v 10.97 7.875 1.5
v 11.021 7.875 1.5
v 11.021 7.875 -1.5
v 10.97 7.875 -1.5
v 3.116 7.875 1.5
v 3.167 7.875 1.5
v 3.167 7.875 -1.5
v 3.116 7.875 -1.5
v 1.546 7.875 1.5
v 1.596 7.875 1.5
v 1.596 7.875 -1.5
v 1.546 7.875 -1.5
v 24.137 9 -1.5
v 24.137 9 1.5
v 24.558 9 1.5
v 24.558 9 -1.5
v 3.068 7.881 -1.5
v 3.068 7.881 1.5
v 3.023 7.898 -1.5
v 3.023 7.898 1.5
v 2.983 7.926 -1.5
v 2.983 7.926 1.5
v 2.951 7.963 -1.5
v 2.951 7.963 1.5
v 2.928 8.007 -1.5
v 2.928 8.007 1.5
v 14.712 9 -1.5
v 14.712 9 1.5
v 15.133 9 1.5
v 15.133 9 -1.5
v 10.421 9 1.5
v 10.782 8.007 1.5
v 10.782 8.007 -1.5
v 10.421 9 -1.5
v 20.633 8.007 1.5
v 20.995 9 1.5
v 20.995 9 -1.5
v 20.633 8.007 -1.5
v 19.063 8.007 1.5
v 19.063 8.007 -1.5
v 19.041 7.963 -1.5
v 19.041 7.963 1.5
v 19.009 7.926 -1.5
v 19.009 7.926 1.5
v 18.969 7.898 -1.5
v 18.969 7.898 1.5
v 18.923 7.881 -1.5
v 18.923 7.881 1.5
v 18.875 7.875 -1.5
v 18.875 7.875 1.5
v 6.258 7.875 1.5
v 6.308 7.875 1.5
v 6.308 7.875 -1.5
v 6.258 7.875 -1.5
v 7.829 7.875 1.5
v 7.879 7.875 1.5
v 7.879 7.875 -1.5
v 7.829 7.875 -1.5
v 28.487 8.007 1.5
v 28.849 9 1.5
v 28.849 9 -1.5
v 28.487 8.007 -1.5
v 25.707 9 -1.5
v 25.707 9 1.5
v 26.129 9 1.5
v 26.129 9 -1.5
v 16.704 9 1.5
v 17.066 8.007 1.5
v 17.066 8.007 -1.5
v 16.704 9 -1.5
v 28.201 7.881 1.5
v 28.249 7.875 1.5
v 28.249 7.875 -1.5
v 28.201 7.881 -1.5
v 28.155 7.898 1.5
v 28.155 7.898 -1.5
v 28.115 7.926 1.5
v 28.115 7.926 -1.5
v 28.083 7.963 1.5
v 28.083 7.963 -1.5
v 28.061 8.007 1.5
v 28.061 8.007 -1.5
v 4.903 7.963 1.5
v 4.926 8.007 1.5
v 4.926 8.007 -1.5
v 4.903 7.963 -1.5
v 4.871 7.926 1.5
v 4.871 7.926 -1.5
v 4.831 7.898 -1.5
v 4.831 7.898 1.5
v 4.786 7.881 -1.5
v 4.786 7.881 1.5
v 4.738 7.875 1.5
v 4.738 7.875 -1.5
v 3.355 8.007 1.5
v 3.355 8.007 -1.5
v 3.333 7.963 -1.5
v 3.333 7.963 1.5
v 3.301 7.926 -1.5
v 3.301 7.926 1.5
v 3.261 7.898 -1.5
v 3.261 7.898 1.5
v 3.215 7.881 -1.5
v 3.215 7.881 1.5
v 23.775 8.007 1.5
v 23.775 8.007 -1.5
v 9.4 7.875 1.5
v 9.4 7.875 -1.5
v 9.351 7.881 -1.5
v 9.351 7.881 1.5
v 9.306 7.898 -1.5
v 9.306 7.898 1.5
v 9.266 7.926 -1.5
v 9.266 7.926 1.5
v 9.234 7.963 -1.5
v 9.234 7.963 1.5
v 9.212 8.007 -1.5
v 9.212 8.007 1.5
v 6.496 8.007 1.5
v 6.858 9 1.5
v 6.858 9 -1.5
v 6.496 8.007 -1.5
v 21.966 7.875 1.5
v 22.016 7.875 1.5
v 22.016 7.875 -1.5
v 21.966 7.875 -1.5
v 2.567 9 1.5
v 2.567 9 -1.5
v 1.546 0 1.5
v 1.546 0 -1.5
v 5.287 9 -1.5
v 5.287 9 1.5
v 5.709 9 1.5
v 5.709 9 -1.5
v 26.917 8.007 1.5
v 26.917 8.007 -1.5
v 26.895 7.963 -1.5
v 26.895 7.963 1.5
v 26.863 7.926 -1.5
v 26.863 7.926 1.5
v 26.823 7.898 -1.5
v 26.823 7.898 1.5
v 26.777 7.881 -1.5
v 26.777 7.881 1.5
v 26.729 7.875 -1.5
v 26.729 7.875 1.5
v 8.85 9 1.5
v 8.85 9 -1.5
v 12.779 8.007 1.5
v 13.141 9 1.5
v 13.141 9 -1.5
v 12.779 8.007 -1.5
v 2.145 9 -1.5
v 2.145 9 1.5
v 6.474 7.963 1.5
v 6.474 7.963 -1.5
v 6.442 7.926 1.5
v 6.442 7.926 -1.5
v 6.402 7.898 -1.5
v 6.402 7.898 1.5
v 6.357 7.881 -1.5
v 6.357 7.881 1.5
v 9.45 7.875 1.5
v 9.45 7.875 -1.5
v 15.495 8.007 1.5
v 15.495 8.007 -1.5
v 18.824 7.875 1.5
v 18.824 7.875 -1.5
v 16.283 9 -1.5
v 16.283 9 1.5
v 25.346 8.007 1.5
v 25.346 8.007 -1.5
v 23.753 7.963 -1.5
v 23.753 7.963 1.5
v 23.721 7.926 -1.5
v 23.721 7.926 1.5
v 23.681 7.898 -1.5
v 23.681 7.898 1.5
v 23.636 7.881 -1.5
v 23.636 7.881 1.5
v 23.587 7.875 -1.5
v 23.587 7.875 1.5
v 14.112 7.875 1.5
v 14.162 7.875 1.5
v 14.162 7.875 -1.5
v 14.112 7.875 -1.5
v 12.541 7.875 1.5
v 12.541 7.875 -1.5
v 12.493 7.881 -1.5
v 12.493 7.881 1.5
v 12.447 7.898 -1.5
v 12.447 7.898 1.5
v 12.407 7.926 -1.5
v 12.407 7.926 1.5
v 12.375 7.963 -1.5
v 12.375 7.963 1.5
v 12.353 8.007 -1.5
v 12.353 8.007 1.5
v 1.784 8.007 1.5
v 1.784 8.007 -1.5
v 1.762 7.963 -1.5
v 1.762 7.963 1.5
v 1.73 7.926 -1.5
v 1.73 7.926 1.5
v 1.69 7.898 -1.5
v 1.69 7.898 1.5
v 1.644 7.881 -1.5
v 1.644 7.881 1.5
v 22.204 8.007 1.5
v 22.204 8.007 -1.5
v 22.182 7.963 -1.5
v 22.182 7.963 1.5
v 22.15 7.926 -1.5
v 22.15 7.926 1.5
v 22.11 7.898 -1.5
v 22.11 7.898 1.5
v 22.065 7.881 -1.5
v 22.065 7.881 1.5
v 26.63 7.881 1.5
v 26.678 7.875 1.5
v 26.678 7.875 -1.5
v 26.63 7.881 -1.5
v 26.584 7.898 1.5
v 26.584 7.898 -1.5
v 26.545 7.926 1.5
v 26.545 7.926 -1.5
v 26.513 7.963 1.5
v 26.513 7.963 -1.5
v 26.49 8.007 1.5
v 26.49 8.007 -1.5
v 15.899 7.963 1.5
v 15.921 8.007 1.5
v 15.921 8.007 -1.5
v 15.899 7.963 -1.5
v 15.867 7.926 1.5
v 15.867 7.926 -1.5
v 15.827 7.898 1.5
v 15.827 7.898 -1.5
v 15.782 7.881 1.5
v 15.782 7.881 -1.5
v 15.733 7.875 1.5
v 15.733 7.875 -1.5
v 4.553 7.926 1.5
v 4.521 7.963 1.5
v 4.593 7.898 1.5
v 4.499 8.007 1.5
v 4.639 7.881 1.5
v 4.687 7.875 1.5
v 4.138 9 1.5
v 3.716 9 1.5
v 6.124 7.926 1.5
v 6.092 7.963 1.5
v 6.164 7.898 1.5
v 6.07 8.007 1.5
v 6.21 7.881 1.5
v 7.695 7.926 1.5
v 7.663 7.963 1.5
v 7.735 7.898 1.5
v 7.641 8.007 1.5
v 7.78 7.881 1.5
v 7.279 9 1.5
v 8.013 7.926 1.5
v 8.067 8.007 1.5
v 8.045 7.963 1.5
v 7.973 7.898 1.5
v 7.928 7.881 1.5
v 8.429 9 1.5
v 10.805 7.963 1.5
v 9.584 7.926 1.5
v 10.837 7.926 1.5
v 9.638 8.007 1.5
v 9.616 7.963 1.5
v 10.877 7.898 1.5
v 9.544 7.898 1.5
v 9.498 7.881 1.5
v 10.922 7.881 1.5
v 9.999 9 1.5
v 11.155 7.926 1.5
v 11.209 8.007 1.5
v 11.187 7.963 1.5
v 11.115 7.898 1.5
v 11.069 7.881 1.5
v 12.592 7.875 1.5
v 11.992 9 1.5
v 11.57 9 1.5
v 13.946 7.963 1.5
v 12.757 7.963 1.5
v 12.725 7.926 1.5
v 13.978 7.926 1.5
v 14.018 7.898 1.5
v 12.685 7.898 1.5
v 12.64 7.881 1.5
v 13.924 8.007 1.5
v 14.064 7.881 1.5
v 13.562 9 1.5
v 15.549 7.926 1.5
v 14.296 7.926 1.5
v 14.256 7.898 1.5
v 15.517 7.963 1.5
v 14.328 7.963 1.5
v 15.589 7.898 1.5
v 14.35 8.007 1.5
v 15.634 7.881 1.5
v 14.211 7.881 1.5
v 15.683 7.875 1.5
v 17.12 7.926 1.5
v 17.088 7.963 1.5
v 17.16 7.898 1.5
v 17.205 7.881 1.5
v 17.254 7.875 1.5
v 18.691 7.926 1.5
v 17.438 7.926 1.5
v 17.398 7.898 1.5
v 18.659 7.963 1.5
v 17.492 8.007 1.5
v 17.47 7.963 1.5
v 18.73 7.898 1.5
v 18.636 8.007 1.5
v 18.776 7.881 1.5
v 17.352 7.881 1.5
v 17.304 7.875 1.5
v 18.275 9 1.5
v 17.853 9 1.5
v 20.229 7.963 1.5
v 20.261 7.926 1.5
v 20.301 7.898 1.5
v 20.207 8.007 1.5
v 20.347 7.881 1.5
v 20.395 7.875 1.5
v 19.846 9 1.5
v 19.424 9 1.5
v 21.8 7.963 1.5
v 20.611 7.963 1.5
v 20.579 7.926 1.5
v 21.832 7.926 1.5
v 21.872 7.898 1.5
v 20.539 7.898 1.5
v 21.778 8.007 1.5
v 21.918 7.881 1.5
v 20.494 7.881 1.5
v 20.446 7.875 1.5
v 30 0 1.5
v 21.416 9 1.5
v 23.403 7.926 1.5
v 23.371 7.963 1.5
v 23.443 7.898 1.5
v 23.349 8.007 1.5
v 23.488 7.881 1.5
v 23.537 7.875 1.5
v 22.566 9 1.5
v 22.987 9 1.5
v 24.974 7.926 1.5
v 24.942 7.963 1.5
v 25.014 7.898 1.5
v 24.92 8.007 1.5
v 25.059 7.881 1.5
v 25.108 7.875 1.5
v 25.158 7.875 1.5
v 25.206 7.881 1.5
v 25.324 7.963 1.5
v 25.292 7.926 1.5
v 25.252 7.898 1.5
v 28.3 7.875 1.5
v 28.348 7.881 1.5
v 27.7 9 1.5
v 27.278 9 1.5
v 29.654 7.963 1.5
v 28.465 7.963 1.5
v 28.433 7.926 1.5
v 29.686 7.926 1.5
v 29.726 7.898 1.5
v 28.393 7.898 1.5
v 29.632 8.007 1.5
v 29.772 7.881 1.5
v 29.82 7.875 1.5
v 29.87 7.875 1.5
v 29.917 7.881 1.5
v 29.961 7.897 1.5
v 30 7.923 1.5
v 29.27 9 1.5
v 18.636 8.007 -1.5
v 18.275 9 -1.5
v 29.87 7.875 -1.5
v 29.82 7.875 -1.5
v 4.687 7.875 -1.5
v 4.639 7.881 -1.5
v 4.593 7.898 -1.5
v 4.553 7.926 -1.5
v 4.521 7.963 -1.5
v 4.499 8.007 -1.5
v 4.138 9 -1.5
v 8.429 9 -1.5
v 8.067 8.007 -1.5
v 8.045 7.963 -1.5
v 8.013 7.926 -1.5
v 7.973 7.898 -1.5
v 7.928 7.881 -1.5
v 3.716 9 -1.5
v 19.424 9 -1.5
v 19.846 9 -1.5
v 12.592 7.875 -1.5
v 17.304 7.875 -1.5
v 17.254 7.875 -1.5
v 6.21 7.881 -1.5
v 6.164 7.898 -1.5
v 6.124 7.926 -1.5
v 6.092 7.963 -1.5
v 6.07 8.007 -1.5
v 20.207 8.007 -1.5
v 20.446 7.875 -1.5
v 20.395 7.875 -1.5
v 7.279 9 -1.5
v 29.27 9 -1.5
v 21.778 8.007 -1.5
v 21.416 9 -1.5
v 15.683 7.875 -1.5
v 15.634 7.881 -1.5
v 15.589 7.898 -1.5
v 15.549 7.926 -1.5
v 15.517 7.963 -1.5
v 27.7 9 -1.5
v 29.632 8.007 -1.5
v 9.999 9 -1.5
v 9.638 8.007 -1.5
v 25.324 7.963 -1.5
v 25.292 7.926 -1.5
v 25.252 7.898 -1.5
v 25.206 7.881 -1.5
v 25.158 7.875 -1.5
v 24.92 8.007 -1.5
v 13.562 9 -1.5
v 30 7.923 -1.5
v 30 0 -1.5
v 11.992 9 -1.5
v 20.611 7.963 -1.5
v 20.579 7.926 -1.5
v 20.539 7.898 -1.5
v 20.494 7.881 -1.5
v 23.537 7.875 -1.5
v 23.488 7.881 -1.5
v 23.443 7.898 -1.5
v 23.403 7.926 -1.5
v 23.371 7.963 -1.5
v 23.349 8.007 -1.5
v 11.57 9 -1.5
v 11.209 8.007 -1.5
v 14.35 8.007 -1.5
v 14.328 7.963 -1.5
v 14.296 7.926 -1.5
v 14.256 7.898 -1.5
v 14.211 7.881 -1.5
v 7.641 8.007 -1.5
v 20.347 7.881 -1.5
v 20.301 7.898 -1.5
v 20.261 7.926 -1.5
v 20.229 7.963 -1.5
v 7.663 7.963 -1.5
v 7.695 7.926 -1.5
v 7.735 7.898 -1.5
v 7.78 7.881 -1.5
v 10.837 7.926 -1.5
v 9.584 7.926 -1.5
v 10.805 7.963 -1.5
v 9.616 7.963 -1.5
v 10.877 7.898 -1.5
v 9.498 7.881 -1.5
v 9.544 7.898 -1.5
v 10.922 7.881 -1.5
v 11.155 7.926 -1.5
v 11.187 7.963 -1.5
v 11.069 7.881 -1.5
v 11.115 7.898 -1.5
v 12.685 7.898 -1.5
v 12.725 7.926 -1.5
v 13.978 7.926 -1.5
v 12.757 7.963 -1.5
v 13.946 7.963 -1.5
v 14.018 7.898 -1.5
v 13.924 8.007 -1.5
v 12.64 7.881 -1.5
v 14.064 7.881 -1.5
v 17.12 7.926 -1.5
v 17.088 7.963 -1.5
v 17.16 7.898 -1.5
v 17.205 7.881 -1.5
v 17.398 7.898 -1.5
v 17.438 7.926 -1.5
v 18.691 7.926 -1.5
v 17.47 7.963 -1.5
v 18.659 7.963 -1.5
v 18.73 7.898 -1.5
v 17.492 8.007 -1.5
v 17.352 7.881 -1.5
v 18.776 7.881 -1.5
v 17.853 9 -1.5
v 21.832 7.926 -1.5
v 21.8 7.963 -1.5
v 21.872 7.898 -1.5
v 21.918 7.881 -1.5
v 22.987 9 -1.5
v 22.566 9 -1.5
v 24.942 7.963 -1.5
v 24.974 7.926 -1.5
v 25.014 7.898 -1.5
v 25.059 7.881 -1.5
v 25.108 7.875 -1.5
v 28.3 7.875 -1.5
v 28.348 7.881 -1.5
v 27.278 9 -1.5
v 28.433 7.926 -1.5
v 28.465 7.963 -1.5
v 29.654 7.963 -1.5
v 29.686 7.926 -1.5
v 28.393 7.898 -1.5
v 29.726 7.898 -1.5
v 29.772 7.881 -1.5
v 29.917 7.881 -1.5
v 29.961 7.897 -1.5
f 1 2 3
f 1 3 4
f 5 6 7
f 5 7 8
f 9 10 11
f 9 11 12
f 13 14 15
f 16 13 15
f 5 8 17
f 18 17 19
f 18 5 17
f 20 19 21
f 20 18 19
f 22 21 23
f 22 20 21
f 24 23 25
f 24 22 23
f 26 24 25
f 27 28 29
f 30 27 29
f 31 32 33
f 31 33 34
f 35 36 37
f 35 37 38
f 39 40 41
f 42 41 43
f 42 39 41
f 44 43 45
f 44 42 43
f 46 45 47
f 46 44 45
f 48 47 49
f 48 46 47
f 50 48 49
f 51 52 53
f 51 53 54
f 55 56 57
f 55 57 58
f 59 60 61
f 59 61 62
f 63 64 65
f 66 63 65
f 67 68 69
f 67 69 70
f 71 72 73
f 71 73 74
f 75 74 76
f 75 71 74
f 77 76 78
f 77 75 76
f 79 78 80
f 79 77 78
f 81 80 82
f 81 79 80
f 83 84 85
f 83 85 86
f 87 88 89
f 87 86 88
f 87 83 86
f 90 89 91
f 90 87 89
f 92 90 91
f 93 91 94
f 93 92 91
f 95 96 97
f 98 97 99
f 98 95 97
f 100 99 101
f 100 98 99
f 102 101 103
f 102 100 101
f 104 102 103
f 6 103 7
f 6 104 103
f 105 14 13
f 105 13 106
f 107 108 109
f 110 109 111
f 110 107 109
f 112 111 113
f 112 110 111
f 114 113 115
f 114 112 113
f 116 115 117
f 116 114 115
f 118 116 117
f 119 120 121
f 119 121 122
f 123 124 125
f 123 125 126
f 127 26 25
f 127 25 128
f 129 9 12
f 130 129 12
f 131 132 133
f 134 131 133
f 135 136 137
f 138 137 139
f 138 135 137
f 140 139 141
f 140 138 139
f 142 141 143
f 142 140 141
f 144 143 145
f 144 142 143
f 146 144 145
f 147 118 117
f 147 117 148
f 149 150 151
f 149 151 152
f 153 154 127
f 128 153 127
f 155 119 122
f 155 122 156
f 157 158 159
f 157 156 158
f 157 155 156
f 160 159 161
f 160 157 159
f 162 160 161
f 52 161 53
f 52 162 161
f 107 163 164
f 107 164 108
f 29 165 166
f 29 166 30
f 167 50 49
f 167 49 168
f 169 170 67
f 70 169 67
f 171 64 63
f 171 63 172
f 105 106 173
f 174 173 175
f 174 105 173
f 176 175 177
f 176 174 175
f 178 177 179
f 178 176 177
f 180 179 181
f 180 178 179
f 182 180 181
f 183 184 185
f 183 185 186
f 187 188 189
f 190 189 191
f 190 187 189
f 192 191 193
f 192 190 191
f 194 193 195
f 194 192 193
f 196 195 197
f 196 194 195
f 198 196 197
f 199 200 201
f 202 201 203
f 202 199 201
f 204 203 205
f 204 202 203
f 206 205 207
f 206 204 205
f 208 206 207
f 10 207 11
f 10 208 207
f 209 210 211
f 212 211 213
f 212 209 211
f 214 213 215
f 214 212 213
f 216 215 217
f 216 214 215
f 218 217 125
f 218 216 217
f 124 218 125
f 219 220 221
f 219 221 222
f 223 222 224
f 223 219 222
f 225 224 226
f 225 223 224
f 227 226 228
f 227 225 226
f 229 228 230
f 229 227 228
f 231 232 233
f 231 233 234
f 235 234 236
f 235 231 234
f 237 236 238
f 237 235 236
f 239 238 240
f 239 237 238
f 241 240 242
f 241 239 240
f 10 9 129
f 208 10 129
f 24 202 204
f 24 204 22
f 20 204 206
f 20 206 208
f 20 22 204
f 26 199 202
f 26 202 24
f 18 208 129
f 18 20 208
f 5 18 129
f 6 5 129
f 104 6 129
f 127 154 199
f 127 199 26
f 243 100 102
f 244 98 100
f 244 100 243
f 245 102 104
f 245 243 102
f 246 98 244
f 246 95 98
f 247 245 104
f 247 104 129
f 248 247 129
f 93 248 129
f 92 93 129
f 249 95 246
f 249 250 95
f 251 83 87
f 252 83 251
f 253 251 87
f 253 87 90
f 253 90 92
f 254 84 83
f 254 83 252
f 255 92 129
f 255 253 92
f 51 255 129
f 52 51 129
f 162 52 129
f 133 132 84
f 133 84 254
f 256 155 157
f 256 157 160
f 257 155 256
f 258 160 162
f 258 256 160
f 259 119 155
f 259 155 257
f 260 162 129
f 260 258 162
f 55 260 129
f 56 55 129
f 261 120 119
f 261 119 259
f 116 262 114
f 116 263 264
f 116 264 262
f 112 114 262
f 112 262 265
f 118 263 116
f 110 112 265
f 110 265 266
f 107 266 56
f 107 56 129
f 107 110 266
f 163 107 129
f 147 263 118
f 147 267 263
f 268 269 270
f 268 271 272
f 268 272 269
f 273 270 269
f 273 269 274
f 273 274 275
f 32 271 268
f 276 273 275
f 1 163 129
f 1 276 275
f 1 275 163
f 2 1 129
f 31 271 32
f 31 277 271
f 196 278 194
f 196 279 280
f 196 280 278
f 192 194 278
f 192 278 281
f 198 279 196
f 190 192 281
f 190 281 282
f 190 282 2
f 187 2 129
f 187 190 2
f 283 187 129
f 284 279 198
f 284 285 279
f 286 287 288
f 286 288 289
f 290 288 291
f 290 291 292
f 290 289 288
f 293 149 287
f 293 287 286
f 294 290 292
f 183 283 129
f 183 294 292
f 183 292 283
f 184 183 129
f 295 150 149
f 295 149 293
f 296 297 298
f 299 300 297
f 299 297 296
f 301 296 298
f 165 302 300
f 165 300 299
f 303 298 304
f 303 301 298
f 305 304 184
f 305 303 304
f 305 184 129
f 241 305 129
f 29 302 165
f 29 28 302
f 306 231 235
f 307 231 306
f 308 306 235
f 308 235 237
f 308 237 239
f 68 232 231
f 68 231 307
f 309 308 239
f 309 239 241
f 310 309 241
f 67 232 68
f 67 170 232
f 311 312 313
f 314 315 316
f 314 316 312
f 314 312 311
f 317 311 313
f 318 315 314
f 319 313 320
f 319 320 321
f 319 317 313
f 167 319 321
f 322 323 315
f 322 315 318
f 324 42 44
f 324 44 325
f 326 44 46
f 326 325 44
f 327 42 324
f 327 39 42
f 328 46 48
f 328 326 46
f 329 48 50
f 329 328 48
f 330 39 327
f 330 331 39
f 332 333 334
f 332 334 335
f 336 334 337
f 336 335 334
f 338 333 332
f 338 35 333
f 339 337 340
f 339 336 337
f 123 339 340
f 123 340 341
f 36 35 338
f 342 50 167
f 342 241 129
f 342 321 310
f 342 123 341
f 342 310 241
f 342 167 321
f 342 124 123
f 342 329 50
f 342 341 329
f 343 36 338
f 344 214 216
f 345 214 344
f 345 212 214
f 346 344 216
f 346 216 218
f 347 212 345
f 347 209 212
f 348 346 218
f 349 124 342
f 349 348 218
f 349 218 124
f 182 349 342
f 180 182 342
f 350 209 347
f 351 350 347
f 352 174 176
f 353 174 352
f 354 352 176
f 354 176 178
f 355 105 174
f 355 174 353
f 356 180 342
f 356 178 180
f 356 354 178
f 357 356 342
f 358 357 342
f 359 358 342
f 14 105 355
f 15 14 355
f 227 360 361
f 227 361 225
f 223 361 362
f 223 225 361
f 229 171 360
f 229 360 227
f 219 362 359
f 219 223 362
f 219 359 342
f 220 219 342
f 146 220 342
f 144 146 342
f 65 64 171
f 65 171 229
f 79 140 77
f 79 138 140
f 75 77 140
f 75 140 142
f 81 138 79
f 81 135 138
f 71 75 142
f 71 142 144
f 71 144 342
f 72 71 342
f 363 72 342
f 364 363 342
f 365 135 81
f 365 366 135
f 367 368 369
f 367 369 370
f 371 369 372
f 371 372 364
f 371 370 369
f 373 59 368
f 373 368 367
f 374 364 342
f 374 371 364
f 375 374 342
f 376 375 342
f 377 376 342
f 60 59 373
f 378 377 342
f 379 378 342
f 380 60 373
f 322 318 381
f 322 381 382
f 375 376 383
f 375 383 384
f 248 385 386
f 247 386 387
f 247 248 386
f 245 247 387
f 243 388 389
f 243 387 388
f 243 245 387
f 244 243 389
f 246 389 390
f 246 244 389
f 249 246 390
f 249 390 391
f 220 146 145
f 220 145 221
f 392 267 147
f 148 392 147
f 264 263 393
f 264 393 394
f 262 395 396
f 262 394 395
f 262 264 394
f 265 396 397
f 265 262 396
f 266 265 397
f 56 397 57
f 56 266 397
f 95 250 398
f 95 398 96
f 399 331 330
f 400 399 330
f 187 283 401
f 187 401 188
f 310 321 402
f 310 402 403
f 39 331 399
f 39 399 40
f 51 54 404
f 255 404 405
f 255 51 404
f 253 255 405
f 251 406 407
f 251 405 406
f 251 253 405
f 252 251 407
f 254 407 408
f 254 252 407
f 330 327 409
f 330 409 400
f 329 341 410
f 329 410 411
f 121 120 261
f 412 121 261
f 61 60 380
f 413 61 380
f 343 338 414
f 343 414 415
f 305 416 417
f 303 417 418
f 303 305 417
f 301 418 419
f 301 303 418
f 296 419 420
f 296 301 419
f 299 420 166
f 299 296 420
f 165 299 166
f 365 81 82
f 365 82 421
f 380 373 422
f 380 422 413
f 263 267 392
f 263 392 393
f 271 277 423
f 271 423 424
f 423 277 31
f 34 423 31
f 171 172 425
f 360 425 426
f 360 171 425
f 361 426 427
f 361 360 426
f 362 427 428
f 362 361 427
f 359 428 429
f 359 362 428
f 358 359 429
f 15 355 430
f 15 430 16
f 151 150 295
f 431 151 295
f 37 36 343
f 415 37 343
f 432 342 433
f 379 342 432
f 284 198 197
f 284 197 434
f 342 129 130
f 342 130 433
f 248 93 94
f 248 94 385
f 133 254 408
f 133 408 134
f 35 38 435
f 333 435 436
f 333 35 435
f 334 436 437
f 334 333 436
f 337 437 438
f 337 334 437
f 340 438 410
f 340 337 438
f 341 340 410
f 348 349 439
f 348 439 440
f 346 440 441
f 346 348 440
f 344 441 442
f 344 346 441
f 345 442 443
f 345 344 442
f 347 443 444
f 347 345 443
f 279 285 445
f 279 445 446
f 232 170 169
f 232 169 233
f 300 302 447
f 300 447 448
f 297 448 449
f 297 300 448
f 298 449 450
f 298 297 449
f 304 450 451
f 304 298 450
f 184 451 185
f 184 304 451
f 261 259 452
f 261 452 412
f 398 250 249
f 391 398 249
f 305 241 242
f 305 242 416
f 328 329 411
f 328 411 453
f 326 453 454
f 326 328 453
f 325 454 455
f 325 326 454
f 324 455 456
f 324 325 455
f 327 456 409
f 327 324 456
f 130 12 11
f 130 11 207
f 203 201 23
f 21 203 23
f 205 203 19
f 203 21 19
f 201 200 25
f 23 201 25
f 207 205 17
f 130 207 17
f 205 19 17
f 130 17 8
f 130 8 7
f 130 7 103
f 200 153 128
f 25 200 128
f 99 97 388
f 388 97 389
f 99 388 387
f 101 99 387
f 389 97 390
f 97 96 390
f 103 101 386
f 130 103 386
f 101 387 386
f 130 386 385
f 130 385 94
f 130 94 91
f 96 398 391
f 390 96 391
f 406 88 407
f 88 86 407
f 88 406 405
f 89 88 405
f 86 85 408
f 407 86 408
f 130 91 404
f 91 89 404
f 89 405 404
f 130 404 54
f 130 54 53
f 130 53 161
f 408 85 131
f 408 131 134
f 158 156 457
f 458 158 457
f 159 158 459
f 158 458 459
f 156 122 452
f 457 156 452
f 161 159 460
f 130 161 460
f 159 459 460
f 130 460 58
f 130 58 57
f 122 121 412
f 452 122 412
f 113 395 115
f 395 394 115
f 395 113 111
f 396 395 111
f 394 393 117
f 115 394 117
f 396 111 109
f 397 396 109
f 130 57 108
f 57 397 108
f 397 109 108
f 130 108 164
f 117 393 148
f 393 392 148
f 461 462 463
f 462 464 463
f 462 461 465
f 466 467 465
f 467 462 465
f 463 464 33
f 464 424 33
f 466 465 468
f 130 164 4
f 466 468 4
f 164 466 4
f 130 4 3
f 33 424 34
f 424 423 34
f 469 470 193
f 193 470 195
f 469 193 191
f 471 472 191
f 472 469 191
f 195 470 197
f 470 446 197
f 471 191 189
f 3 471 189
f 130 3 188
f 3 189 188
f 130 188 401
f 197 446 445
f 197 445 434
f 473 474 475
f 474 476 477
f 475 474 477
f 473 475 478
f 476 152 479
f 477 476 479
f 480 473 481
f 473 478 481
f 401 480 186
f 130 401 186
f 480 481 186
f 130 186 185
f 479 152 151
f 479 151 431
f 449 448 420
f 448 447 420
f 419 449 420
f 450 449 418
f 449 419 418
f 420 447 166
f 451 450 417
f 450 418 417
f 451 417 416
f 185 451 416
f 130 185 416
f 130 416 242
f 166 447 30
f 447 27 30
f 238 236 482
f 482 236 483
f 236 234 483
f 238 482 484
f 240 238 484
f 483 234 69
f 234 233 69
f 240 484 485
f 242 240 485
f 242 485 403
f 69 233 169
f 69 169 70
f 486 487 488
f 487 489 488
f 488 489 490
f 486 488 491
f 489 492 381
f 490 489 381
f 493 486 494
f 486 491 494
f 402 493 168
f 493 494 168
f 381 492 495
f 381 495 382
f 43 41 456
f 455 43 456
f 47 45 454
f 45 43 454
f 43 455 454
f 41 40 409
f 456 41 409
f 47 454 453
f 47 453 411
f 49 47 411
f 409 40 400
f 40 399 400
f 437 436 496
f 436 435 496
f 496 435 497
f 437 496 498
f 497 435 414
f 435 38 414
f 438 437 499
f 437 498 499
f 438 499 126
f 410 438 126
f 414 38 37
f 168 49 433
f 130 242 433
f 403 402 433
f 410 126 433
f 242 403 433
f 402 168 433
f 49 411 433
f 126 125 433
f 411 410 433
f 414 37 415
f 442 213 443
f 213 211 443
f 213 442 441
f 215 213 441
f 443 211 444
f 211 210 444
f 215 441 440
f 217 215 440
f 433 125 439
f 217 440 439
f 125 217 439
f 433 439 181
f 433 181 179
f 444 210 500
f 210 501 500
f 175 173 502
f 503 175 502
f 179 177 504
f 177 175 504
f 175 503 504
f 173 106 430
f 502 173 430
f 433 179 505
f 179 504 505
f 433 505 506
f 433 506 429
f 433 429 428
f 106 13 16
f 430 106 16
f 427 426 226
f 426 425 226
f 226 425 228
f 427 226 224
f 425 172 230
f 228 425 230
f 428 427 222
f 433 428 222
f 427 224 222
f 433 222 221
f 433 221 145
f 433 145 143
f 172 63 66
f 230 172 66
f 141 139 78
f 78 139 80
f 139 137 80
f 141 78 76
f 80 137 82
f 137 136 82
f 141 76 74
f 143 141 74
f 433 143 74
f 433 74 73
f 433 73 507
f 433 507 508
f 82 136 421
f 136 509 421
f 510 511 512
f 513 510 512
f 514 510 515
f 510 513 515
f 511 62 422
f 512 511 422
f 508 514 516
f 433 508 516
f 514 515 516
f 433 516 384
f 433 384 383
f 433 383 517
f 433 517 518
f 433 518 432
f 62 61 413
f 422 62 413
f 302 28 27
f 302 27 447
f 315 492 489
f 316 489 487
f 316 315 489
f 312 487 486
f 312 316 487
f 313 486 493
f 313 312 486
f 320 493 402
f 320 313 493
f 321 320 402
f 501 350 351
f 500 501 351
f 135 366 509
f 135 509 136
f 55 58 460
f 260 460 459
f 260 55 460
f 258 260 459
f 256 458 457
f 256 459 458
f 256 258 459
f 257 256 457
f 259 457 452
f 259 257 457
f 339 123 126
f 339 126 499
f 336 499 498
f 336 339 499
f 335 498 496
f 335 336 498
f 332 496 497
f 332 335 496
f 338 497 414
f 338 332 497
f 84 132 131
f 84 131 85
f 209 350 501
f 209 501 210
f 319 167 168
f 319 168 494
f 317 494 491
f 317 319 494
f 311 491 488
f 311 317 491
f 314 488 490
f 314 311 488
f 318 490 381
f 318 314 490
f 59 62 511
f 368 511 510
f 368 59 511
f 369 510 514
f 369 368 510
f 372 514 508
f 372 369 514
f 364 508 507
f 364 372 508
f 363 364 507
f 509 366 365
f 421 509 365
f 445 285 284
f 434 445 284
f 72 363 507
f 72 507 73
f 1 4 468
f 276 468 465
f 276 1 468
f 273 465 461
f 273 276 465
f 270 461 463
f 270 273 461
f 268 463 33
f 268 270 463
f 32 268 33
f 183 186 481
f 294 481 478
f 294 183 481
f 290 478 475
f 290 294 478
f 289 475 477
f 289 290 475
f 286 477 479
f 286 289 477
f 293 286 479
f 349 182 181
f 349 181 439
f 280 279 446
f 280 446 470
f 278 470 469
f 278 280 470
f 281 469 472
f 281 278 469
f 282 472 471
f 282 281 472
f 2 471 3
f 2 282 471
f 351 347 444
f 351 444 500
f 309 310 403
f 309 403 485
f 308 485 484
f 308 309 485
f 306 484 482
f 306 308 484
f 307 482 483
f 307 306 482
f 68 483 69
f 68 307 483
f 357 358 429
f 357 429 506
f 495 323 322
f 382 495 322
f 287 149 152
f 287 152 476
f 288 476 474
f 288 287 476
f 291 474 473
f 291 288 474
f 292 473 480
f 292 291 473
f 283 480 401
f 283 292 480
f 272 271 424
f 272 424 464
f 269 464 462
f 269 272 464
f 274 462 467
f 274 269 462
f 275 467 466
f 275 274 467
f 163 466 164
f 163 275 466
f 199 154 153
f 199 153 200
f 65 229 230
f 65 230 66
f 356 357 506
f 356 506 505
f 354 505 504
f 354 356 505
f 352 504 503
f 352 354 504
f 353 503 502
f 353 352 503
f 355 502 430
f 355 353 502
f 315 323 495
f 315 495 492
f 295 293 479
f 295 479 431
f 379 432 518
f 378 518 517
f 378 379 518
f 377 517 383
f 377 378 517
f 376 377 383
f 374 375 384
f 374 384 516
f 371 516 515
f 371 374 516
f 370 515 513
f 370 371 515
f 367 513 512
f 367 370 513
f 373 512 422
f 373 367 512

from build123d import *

# Parameters (mm, degrees)
SKETCH1_W           = 30
SKETCH1_H           = 9
BOSS_EXTRUDE1_DEPTH = 1.5
CUT_EXTRUDE1_DEPTH  = 32.464265445
LPATTERN1_COUNT     = 20
LPATTERN1_PITCH     = 1.570796327
SKETCH9_W           = 1.545620149
SKETCH9_H           = 3
CUT_EXTRUDE2_DEPTH  = 32.356817441


with BuildPart() as part:
    # Sketch1 → Boss-Extrude1 (new, symmetric)
    with BuildSketch(Plane.XY):
        with Locations((15, 4.5)):
            Rectangle(SKETCH1_W, SKETCH1_H)
    extrude(amount=BOSS_EXTRUDE1_DEPTH, both=True)

    # Sketch2 → Cut-Extrude1 (cut, through all)
    with BuildSketch(Plane.XY.offset(1.5)):
        with BuildLine():
            Line((-0.574684199, 9), (0.574684199, 9))
            Line((0.574684199, 9), (0.213114702, 8.006595971))
            ThreePointArc((0.213114702, 8.006595971), (0.139891465, 7.911169591), (0.025176178, 7.875))
            Line((0.025176178, 7.875), (-0.025176178, 7.875))
            ThreePointArc((-0.025176178, 7.875), (-0.139891465, 7.911169591), (-0.213114702, 8.006595971))
            Line((-0.213114702, 8.006595971), (-0.574684199, 9))
        make_face()
    cut_extrude1 = extrude(amount=-CUT_EXTRUDE1_DEPTH, mode=Mode.SUBTRACT)

    # LPattern1: Cut-Extrude1 ×20
    with Locations(*[(i * LPATTERN1_PITCH, 0, 0) for i in range(1, LPATTERN1_COUNT)]):
        add(cut_extrude1, mode=Mode.SUBTRACT)

    # Sketch9 → Cut-Extrude2 (cut, through all)
    with BuildSketch(Plane(origin=(0, 9, 0), x_dir=(1, 0, 0), z_dir=(0, 1, 0))):
        with Locations((0.772810075, 0)):
            Rectangle(SKETCH9_W, SKETCH9_H)
    extrude(amount=-CUT_EXTRUDE2_DEPTH, mode=Mode.SUBTRACT)


solid = part.part
